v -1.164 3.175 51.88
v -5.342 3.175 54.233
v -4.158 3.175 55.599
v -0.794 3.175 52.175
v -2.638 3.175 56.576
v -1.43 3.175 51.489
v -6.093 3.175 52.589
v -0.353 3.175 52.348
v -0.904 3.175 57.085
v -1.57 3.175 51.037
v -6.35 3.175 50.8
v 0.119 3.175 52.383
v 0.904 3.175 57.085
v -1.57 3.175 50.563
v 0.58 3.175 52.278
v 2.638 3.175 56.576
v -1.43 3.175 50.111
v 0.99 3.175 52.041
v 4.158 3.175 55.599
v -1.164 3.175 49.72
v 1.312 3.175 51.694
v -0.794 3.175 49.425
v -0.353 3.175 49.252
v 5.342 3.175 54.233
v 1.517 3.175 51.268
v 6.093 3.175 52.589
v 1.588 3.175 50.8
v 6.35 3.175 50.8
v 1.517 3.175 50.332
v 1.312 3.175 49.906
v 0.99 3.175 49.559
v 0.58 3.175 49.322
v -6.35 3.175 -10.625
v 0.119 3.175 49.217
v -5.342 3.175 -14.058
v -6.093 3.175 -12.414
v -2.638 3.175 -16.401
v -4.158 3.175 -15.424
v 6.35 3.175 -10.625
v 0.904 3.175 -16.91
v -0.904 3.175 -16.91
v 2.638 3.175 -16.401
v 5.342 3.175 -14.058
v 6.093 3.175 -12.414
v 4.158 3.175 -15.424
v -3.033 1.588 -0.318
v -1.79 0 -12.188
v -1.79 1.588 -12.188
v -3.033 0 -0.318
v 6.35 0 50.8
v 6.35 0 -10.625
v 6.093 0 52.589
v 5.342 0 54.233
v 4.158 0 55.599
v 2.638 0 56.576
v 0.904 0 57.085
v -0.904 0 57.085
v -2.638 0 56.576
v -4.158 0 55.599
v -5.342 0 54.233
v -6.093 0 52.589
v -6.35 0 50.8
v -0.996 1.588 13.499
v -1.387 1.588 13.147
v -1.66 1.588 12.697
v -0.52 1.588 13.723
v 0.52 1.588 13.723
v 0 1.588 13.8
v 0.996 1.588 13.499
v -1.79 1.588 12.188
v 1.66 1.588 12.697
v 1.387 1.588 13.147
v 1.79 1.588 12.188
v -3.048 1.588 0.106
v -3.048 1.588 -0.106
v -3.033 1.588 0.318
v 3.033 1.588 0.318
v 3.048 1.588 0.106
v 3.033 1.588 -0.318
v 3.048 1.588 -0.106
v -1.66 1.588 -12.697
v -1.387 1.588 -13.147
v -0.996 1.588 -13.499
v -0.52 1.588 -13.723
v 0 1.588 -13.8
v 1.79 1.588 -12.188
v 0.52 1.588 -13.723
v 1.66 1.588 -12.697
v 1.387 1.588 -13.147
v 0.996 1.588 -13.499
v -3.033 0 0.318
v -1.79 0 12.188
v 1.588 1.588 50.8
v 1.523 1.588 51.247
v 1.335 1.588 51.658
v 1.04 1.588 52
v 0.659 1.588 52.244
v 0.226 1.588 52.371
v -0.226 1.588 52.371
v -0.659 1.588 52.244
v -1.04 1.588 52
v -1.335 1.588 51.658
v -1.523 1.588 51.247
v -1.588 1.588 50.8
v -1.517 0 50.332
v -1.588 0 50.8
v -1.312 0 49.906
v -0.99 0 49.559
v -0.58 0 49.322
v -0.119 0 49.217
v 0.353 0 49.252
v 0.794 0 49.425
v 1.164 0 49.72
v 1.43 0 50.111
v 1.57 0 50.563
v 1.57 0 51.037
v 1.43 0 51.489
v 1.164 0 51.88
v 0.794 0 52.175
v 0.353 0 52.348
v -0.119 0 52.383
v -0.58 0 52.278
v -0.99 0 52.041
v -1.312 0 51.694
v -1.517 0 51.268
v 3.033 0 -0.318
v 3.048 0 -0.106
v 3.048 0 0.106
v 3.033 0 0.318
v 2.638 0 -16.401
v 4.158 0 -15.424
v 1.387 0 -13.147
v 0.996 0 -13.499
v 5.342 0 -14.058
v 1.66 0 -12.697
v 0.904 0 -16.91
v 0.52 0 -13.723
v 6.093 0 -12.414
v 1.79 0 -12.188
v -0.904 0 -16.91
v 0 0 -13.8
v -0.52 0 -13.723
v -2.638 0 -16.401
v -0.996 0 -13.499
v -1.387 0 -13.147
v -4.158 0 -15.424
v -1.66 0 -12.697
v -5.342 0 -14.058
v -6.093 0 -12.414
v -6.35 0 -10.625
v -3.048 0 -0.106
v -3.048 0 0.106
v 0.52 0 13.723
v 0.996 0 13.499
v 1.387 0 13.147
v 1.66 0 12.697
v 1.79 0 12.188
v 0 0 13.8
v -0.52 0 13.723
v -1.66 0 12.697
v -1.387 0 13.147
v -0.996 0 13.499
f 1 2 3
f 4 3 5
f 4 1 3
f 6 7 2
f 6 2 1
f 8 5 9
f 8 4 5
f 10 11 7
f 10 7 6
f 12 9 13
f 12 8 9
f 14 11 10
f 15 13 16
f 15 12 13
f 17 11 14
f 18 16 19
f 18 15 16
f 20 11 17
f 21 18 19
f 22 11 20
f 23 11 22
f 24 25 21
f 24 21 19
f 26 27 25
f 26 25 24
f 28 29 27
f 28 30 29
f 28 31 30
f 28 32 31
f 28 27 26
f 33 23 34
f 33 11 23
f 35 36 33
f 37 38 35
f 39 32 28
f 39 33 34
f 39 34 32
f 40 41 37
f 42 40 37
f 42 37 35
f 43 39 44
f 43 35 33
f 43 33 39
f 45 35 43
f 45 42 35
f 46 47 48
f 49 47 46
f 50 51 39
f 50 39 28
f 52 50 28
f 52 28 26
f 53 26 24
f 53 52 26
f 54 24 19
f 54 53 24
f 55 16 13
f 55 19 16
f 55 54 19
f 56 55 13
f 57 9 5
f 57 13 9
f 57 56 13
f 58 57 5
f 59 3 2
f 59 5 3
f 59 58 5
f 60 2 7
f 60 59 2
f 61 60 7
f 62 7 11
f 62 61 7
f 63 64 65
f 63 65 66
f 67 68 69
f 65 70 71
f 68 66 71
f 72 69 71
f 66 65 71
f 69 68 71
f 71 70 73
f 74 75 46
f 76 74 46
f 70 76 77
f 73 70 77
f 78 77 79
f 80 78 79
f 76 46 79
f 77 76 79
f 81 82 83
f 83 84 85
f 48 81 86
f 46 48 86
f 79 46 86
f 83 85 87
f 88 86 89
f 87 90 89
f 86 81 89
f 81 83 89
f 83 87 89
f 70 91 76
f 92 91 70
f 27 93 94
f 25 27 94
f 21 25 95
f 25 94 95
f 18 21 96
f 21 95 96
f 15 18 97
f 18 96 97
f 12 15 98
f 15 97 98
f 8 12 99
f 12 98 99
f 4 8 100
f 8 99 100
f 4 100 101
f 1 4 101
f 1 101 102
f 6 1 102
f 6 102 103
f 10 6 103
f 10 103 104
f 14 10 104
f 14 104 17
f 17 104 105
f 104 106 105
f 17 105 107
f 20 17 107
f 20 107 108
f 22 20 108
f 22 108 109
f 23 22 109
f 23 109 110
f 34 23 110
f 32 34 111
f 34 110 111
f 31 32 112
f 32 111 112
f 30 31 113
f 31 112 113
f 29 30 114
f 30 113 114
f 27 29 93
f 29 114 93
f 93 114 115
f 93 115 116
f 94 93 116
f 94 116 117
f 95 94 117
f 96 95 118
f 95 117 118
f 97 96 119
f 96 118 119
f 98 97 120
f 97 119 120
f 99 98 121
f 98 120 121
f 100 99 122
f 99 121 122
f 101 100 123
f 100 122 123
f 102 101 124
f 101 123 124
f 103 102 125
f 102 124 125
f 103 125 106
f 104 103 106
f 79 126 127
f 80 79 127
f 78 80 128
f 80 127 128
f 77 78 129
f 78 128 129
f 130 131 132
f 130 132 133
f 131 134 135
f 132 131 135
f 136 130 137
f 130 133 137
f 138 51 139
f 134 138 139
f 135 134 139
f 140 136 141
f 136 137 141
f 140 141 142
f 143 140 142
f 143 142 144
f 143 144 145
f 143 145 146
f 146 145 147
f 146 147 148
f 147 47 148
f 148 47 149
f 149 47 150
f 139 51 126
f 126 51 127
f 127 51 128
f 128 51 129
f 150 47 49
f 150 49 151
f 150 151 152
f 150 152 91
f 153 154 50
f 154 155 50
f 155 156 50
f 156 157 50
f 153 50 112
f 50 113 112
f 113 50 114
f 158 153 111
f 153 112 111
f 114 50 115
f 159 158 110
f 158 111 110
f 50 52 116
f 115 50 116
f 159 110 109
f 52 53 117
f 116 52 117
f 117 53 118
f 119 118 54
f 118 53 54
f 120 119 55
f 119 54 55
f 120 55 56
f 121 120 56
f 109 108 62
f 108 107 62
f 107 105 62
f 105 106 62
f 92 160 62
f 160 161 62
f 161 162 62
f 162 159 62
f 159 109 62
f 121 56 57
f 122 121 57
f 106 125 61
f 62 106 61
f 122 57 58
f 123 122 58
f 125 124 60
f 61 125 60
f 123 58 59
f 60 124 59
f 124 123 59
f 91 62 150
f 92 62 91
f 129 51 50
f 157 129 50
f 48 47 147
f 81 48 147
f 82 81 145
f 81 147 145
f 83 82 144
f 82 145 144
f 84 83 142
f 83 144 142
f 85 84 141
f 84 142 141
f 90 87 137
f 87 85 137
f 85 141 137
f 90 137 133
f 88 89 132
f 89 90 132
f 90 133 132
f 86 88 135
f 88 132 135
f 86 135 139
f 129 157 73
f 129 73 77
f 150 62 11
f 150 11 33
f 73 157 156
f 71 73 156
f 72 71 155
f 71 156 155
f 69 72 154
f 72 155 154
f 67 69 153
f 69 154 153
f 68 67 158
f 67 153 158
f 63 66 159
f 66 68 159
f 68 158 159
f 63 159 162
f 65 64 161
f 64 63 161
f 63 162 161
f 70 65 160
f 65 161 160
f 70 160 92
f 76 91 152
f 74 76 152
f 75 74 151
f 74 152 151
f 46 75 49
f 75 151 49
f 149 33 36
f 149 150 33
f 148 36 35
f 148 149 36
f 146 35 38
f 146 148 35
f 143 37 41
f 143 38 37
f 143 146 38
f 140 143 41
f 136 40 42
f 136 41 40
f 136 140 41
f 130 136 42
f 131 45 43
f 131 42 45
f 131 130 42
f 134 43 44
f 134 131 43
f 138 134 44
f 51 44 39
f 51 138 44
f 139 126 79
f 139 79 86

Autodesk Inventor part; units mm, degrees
ref_plane "YZ Plane" through (0, 0, 0) normal (1, 0, 0) x (0, 1, 0)
ref_plane "XZ Plane" through (0, 0, 0) normal (0, 1, 0) x (-1, 0, 0)
ref_plane "XY Plane" through (0, 0, 0) normal (0, 0, 1) x (1, 0, 0)
sketch "Sketch1" plane through (0, 0, 0) normal (0, 1, 0) x (-1, 0, 0)
  arc A0 (1.4918, 12.1563) -> (-1.4918, 12.1563) centre (0, 12) ccw
  arc A1 (-1.4918, -12.1563) -> (1.4918, -12.1563) centre (0, -12) ccw
  line L0 (0, -12) -> (0, 12) construction
  line L1 (-2.735, 0.2865) -> (-1.4918, 12.1563)
  line L2 (1.4918, -12.1563) -> (2.735, -0.2865)
  line L3 (-1.4918, -12.1563) -> (-2.735, -0.2865)
  line L4 (2.735, 0.2865) -> (1.4918, 12.1563)
  arc A2 (-2.735, 0.2865) -> (-2.735, -0.2865) centre (0, 0) ccw
  arc A3 (2.735, -0.2865) -> (2.735, 0.2865) centre (0, 0) ccw
  line L5 (2.75, 0) -> (-2.75, 0) construction
  line L6 (-3.0334, -0.3177) -> (-1.7902, -12.1875)
  arc A4 (-1.7902, -12.1875) -> (1.7902, -12.1875) centre (0, -12) ccw
  line L7 (1.7902, -12.1875) -> (3.0334, -0.3177)
  arc A5 (3.0334, -0.3177) -> (3.0334, 0.3177) centre (0, 0) ccw
  line L8 (3.0334, 0.3177) -> (1.7902, 12.1875)
  arc A6 (1.7902, 12.1875) -> (-1.7902, 12.1875) centre (0, 12) ccw
  line L9 (-1.7902, 12.1875) -> (-3.0334, 0.3177)
  arc A7 (-3.0334, 0.3177) -> (-3.0334, -0.3177) centre (0, 0) ccw
  line L10 (0, -4.275) -> (0, 57.15) construction
  line L11 (-6.35, -10.625) -> (-6.35, 50.8)
  line L12 (6.35, 50.8) -> (6.35, -10.625)
  arc A8 (-6.35, -10.625) -> (6.35, -10.625) centre (0, -10.625) ccw
  arc A9 (6.35, 50.8) -> (-6.35, 50.8) centre (0, 50.8) ccw
  circle A10 centre (0, 50.8) radius 1.5875
  point P0 (0, 0)
  point P1 (0, -13.8)
  point P2 (0, -16.975)
  dimension "d5" = 3
  dimension "d6" = 3
  dimension "d7" = 24
  dimension "d8" = 5.5
  dimension "d9" = 0.3
  dimension "d13" = 50.8
  dimension "d15" = 3.175
  dimension "d17" = 3.175
  dimension "d19" = 6.35
  dimension "d20" = 6.35
extrude "Extrusion1" add sketch "Sketch1" along normal blind 1.5875 contours L11 A9 L12 A8
sketch "Sketch2" plane through (0, 1.5875, 0) normal (0, 1, 0) x (1, 0, 0)
  line L0 (6.35, -50.8) -> (6.35, 10.625) projected
  arc A0 (6.35, 10.625) -> (-6.35, 10.625) centre (0, 10.625) ccw projected
  line L1 (-6.35, 10.625) -> (-6.35, -50.8) projected
  arc A1 (-6.35, -50.8) -> (6.35, -50.8) centre (0, -50.8) ccw projected
  arc A2 (3.0334, -0.3177) -> (3.0334, 0.3177) centre (0, 0) ccw projected
  line L2 (3.0334, -0.3177) -> (1.7902, -12.1875) projected
  arc A3 (-1.7902, -12.1875) -> (1.7902, -12.1875) centre (0, -12) ccw projected
  line L3 (-1.7902, -12.1875) -> (-3.0334, -0.3177) projected
  arc A4 (-3.0334, 0.3177) -> (-3.0334, -0.3177) centre (0, 0) ccw projected
  line L4 (-3.0334, 0.3177) -> (-1.7902, 12.1875) projected
  arc A5 (1.7902, 12.1875) -> (-1.7902, 12.1875) centre (0, 12) ccw projected
  line L5 (1.7902, 12.1875) -> (3.0334, 0.3177) projected
  circle A6 centre (0, -50.8) radius 1.5875 projected
extrude "Extrusion2" add sketch "Sketch2" along normal blind 1.5875 contours A1 L1 A0 L0 | L2 A3 L3 A4 L4 A5 L5 A2
properties part number "arm3"
